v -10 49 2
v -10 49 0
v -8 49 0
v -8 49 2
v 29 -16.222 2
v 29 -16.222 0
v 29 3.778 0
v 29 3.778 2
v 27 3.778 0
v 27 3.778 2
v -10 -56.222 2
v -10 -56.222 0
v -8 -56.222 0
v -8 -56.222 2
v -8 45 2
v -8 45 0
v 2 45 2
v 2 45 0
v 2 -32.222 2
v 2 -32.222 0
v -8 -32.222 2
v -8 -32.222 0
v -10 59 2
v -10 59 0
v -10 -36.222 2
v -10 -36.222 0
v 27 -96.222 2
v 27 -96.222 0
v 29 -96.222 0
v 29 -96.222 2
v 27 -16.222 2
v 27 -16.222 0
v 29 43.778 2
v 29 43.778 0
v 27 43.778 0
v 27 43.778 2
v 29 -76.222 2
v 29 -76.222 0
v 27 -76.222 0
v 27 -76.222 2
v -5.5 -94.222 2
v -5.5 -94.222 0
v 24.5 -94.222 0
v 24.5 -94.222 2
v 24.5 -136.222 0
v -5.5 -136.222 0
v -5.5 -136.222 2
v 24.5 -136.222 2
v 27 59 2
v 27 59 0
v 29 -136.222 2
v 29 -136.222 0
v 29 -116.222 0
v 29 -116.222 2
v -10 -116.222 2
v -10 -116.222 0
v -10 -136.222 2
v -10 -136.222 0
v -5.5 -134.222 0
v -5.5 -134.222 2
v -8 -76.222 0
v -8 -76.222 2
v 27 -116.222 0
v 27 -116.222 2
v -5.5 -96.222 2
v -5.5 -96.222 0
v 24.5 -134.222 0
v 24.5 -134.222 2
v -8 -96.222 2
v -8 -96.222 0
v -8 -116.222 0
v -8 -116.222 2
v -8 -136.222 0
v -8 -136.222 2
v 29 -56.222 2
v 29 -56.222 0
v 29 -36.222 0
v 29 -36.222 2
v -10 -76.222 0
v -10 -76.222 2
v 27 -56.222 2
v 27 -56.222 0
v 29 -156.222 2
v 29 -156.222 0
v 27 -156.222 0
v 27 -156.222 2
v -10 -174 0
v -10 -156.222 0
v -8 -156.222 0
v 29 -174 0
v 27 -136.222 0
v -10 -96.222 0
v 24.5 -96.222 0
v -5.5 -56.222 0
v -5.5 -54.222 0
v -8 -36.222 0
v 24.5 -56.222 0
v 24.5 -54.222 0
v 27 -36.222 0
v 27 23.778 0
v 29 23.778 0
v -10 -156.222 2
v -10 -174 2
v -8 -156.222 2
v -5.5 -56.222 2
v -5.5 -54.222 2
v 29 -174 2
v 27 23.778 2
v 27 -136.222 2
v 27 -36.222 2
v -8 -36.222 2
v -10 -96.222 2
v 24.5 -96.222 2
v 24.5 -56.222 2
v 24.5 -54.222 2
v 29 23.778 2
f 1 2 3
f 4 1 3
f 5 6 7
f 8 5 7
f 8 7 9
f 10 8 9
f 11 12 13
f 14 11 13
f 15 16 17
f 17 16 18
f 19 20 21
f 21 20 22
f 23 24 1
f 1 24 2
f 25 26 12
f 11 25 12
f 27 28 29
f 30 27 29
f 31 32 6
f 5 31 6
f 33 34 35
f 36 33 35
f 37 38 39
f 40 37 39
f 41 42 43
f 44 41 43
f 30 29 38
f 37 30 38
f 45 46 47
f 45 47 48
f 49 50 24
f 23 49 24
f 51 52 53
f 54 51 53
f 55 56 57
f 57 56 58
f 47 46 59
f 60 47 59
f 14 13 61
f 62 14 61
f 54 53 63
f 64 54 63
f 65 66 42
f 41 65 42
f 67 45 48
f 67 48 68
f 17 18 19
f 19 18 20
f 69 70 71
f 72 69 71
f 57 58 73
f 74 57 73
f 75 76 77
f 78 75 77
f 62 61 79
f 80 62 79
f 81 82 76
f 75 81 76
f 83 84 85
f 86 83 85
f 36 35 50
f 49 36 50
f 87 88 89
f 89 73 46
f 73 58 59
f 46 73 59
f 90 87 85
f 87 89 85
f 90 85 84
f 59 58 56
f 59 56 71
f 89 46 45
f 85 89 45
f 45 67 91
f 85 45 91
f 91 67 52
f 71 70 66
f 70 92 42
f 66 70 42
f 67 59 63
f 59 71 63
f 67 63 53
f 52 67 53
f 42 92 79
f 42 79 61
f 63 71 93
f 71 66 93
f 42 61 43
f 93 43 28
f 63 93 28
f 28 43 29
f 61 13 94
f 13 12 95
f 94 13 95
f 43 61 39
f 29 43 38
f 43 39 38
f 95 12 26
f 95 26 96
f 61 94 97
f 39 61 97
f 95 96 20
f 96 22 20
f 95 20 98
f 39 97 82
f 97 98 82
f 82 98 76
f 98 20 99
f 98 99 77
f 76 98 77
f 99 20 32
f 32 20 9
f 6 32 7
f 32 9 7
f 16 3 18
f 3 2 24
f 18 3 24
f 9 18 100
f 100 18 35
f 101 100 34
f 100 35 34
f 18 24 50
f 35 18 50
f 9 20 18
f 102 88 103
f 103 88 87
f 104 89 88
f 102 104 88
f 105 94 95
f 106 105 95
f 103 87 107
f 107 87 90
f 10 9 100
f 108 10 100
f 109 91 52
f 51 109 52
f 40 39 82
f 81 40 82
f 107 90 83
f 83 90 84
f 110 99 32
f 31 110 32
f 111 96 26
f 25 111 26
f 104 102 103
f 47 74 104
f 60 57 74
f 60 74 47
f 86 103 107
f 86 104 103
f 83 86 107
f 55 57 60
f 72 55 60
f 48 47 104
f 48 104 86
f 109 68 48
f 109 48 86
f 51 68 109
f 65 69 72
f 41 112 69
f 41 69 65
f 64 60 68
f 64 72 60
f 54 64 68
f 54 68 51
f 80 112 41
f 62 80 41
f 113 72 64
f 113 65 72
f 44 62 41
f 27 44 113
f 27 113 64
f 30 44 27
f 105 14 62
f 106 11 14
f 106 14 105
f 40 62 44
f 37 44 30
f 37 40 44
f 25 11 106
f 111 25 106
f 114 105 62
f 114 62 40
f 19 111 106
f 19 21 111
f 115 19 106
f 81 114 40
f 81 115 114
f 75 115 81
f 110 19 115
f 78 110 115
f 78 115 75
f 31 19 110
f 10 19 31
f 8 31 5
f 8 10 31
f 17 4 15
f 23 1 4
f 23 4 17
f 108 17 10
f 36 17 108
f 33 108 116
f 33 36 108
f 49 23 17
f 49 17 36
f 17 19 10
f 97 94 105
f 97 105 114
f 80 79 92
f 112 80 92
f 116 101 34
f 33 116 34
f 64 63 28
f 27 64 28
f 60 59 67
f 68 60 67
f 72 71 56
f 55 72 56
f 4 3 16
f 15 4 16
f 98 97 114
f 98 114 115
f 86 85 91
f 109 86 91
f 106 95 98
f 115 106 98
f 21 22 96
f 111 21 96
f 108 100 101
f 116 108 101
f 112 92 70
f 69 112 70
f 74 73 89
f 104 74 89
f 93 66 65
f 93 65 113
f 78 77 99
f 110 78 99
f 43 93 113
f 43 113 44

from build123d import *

# Parameters (mm, degrees)
SKETCH_1_W      = 30
SKETCH_1_H      = 2
EXTRUDE_2_DEPTH = 2


with BuildPart() as part:
    # 草图1 → 凸台-拉伸2 (new body)
    with BuildSketch(Plane.XY):
        Polygon((-8, -36.22154055), (-10, -36.22154055), (-10, -56.22154055), (-8, -56.22154055), (-8, -76.22154055), (-10, -76.22154055), (-10, -96.22154055), (-8, -96.22154055), (-8, -116.22154055), (-10, -116.22154055), (-10, -136.22154055), (-8, -136.22154055), (-8, -156.22154055), (-10, -156.22154055), (-10, -174), (-8, -174), (27, -174), (29, -174), (29, -156.22154055), (27, -156.22154055), (27, -136.22154055), (29, -136.22154055), (29, -116.22154055), (27, -116.22154055), (27, -96.22154055), (29, -96.22154055), (29, -76.22154055), (27, -76.22154055), (27, -56.22154055), (29, -56.22154055), (29, -36.22154055), (27, -36.22154055), (27, -16.22154055), (29, -16.22154055), (29, 3.77845945), (27, 3.77845945), (27, 23.77845945), (29, 23.77845945), (29, 43.77845945), (27, 43.77845945), (27, 49), (27, 59), (-10, 59), (-10, 49), (-8, 49), (-8, 45), (2, 45), (2, 43.34252786), (2, 15.14100393), (2, -15.14100393), (2, -31.22154055), (2, -32.22154055), (-8, -32.22154055), align=None)
        with Locations((9.5, -95.22154055)):
            Rectangle(SKETCH_1_W, SKETCH_1_H, mode=Mode.SUBTRACT)
        with Locations((9.5, -135.22154055)):
            Rectangle(SKETCH_1_W, SKETCH_1_H, mode=Mode.SUBTRACT)
        with Locations((9.5, -55.22154055)):
            Rectangle(SKETCH_1_W, SKETCH_1_H, mode=Mode.SUBTRACT)
    extrude(amount=EXTRUDE_2_DEPTH)


solid = part.part
